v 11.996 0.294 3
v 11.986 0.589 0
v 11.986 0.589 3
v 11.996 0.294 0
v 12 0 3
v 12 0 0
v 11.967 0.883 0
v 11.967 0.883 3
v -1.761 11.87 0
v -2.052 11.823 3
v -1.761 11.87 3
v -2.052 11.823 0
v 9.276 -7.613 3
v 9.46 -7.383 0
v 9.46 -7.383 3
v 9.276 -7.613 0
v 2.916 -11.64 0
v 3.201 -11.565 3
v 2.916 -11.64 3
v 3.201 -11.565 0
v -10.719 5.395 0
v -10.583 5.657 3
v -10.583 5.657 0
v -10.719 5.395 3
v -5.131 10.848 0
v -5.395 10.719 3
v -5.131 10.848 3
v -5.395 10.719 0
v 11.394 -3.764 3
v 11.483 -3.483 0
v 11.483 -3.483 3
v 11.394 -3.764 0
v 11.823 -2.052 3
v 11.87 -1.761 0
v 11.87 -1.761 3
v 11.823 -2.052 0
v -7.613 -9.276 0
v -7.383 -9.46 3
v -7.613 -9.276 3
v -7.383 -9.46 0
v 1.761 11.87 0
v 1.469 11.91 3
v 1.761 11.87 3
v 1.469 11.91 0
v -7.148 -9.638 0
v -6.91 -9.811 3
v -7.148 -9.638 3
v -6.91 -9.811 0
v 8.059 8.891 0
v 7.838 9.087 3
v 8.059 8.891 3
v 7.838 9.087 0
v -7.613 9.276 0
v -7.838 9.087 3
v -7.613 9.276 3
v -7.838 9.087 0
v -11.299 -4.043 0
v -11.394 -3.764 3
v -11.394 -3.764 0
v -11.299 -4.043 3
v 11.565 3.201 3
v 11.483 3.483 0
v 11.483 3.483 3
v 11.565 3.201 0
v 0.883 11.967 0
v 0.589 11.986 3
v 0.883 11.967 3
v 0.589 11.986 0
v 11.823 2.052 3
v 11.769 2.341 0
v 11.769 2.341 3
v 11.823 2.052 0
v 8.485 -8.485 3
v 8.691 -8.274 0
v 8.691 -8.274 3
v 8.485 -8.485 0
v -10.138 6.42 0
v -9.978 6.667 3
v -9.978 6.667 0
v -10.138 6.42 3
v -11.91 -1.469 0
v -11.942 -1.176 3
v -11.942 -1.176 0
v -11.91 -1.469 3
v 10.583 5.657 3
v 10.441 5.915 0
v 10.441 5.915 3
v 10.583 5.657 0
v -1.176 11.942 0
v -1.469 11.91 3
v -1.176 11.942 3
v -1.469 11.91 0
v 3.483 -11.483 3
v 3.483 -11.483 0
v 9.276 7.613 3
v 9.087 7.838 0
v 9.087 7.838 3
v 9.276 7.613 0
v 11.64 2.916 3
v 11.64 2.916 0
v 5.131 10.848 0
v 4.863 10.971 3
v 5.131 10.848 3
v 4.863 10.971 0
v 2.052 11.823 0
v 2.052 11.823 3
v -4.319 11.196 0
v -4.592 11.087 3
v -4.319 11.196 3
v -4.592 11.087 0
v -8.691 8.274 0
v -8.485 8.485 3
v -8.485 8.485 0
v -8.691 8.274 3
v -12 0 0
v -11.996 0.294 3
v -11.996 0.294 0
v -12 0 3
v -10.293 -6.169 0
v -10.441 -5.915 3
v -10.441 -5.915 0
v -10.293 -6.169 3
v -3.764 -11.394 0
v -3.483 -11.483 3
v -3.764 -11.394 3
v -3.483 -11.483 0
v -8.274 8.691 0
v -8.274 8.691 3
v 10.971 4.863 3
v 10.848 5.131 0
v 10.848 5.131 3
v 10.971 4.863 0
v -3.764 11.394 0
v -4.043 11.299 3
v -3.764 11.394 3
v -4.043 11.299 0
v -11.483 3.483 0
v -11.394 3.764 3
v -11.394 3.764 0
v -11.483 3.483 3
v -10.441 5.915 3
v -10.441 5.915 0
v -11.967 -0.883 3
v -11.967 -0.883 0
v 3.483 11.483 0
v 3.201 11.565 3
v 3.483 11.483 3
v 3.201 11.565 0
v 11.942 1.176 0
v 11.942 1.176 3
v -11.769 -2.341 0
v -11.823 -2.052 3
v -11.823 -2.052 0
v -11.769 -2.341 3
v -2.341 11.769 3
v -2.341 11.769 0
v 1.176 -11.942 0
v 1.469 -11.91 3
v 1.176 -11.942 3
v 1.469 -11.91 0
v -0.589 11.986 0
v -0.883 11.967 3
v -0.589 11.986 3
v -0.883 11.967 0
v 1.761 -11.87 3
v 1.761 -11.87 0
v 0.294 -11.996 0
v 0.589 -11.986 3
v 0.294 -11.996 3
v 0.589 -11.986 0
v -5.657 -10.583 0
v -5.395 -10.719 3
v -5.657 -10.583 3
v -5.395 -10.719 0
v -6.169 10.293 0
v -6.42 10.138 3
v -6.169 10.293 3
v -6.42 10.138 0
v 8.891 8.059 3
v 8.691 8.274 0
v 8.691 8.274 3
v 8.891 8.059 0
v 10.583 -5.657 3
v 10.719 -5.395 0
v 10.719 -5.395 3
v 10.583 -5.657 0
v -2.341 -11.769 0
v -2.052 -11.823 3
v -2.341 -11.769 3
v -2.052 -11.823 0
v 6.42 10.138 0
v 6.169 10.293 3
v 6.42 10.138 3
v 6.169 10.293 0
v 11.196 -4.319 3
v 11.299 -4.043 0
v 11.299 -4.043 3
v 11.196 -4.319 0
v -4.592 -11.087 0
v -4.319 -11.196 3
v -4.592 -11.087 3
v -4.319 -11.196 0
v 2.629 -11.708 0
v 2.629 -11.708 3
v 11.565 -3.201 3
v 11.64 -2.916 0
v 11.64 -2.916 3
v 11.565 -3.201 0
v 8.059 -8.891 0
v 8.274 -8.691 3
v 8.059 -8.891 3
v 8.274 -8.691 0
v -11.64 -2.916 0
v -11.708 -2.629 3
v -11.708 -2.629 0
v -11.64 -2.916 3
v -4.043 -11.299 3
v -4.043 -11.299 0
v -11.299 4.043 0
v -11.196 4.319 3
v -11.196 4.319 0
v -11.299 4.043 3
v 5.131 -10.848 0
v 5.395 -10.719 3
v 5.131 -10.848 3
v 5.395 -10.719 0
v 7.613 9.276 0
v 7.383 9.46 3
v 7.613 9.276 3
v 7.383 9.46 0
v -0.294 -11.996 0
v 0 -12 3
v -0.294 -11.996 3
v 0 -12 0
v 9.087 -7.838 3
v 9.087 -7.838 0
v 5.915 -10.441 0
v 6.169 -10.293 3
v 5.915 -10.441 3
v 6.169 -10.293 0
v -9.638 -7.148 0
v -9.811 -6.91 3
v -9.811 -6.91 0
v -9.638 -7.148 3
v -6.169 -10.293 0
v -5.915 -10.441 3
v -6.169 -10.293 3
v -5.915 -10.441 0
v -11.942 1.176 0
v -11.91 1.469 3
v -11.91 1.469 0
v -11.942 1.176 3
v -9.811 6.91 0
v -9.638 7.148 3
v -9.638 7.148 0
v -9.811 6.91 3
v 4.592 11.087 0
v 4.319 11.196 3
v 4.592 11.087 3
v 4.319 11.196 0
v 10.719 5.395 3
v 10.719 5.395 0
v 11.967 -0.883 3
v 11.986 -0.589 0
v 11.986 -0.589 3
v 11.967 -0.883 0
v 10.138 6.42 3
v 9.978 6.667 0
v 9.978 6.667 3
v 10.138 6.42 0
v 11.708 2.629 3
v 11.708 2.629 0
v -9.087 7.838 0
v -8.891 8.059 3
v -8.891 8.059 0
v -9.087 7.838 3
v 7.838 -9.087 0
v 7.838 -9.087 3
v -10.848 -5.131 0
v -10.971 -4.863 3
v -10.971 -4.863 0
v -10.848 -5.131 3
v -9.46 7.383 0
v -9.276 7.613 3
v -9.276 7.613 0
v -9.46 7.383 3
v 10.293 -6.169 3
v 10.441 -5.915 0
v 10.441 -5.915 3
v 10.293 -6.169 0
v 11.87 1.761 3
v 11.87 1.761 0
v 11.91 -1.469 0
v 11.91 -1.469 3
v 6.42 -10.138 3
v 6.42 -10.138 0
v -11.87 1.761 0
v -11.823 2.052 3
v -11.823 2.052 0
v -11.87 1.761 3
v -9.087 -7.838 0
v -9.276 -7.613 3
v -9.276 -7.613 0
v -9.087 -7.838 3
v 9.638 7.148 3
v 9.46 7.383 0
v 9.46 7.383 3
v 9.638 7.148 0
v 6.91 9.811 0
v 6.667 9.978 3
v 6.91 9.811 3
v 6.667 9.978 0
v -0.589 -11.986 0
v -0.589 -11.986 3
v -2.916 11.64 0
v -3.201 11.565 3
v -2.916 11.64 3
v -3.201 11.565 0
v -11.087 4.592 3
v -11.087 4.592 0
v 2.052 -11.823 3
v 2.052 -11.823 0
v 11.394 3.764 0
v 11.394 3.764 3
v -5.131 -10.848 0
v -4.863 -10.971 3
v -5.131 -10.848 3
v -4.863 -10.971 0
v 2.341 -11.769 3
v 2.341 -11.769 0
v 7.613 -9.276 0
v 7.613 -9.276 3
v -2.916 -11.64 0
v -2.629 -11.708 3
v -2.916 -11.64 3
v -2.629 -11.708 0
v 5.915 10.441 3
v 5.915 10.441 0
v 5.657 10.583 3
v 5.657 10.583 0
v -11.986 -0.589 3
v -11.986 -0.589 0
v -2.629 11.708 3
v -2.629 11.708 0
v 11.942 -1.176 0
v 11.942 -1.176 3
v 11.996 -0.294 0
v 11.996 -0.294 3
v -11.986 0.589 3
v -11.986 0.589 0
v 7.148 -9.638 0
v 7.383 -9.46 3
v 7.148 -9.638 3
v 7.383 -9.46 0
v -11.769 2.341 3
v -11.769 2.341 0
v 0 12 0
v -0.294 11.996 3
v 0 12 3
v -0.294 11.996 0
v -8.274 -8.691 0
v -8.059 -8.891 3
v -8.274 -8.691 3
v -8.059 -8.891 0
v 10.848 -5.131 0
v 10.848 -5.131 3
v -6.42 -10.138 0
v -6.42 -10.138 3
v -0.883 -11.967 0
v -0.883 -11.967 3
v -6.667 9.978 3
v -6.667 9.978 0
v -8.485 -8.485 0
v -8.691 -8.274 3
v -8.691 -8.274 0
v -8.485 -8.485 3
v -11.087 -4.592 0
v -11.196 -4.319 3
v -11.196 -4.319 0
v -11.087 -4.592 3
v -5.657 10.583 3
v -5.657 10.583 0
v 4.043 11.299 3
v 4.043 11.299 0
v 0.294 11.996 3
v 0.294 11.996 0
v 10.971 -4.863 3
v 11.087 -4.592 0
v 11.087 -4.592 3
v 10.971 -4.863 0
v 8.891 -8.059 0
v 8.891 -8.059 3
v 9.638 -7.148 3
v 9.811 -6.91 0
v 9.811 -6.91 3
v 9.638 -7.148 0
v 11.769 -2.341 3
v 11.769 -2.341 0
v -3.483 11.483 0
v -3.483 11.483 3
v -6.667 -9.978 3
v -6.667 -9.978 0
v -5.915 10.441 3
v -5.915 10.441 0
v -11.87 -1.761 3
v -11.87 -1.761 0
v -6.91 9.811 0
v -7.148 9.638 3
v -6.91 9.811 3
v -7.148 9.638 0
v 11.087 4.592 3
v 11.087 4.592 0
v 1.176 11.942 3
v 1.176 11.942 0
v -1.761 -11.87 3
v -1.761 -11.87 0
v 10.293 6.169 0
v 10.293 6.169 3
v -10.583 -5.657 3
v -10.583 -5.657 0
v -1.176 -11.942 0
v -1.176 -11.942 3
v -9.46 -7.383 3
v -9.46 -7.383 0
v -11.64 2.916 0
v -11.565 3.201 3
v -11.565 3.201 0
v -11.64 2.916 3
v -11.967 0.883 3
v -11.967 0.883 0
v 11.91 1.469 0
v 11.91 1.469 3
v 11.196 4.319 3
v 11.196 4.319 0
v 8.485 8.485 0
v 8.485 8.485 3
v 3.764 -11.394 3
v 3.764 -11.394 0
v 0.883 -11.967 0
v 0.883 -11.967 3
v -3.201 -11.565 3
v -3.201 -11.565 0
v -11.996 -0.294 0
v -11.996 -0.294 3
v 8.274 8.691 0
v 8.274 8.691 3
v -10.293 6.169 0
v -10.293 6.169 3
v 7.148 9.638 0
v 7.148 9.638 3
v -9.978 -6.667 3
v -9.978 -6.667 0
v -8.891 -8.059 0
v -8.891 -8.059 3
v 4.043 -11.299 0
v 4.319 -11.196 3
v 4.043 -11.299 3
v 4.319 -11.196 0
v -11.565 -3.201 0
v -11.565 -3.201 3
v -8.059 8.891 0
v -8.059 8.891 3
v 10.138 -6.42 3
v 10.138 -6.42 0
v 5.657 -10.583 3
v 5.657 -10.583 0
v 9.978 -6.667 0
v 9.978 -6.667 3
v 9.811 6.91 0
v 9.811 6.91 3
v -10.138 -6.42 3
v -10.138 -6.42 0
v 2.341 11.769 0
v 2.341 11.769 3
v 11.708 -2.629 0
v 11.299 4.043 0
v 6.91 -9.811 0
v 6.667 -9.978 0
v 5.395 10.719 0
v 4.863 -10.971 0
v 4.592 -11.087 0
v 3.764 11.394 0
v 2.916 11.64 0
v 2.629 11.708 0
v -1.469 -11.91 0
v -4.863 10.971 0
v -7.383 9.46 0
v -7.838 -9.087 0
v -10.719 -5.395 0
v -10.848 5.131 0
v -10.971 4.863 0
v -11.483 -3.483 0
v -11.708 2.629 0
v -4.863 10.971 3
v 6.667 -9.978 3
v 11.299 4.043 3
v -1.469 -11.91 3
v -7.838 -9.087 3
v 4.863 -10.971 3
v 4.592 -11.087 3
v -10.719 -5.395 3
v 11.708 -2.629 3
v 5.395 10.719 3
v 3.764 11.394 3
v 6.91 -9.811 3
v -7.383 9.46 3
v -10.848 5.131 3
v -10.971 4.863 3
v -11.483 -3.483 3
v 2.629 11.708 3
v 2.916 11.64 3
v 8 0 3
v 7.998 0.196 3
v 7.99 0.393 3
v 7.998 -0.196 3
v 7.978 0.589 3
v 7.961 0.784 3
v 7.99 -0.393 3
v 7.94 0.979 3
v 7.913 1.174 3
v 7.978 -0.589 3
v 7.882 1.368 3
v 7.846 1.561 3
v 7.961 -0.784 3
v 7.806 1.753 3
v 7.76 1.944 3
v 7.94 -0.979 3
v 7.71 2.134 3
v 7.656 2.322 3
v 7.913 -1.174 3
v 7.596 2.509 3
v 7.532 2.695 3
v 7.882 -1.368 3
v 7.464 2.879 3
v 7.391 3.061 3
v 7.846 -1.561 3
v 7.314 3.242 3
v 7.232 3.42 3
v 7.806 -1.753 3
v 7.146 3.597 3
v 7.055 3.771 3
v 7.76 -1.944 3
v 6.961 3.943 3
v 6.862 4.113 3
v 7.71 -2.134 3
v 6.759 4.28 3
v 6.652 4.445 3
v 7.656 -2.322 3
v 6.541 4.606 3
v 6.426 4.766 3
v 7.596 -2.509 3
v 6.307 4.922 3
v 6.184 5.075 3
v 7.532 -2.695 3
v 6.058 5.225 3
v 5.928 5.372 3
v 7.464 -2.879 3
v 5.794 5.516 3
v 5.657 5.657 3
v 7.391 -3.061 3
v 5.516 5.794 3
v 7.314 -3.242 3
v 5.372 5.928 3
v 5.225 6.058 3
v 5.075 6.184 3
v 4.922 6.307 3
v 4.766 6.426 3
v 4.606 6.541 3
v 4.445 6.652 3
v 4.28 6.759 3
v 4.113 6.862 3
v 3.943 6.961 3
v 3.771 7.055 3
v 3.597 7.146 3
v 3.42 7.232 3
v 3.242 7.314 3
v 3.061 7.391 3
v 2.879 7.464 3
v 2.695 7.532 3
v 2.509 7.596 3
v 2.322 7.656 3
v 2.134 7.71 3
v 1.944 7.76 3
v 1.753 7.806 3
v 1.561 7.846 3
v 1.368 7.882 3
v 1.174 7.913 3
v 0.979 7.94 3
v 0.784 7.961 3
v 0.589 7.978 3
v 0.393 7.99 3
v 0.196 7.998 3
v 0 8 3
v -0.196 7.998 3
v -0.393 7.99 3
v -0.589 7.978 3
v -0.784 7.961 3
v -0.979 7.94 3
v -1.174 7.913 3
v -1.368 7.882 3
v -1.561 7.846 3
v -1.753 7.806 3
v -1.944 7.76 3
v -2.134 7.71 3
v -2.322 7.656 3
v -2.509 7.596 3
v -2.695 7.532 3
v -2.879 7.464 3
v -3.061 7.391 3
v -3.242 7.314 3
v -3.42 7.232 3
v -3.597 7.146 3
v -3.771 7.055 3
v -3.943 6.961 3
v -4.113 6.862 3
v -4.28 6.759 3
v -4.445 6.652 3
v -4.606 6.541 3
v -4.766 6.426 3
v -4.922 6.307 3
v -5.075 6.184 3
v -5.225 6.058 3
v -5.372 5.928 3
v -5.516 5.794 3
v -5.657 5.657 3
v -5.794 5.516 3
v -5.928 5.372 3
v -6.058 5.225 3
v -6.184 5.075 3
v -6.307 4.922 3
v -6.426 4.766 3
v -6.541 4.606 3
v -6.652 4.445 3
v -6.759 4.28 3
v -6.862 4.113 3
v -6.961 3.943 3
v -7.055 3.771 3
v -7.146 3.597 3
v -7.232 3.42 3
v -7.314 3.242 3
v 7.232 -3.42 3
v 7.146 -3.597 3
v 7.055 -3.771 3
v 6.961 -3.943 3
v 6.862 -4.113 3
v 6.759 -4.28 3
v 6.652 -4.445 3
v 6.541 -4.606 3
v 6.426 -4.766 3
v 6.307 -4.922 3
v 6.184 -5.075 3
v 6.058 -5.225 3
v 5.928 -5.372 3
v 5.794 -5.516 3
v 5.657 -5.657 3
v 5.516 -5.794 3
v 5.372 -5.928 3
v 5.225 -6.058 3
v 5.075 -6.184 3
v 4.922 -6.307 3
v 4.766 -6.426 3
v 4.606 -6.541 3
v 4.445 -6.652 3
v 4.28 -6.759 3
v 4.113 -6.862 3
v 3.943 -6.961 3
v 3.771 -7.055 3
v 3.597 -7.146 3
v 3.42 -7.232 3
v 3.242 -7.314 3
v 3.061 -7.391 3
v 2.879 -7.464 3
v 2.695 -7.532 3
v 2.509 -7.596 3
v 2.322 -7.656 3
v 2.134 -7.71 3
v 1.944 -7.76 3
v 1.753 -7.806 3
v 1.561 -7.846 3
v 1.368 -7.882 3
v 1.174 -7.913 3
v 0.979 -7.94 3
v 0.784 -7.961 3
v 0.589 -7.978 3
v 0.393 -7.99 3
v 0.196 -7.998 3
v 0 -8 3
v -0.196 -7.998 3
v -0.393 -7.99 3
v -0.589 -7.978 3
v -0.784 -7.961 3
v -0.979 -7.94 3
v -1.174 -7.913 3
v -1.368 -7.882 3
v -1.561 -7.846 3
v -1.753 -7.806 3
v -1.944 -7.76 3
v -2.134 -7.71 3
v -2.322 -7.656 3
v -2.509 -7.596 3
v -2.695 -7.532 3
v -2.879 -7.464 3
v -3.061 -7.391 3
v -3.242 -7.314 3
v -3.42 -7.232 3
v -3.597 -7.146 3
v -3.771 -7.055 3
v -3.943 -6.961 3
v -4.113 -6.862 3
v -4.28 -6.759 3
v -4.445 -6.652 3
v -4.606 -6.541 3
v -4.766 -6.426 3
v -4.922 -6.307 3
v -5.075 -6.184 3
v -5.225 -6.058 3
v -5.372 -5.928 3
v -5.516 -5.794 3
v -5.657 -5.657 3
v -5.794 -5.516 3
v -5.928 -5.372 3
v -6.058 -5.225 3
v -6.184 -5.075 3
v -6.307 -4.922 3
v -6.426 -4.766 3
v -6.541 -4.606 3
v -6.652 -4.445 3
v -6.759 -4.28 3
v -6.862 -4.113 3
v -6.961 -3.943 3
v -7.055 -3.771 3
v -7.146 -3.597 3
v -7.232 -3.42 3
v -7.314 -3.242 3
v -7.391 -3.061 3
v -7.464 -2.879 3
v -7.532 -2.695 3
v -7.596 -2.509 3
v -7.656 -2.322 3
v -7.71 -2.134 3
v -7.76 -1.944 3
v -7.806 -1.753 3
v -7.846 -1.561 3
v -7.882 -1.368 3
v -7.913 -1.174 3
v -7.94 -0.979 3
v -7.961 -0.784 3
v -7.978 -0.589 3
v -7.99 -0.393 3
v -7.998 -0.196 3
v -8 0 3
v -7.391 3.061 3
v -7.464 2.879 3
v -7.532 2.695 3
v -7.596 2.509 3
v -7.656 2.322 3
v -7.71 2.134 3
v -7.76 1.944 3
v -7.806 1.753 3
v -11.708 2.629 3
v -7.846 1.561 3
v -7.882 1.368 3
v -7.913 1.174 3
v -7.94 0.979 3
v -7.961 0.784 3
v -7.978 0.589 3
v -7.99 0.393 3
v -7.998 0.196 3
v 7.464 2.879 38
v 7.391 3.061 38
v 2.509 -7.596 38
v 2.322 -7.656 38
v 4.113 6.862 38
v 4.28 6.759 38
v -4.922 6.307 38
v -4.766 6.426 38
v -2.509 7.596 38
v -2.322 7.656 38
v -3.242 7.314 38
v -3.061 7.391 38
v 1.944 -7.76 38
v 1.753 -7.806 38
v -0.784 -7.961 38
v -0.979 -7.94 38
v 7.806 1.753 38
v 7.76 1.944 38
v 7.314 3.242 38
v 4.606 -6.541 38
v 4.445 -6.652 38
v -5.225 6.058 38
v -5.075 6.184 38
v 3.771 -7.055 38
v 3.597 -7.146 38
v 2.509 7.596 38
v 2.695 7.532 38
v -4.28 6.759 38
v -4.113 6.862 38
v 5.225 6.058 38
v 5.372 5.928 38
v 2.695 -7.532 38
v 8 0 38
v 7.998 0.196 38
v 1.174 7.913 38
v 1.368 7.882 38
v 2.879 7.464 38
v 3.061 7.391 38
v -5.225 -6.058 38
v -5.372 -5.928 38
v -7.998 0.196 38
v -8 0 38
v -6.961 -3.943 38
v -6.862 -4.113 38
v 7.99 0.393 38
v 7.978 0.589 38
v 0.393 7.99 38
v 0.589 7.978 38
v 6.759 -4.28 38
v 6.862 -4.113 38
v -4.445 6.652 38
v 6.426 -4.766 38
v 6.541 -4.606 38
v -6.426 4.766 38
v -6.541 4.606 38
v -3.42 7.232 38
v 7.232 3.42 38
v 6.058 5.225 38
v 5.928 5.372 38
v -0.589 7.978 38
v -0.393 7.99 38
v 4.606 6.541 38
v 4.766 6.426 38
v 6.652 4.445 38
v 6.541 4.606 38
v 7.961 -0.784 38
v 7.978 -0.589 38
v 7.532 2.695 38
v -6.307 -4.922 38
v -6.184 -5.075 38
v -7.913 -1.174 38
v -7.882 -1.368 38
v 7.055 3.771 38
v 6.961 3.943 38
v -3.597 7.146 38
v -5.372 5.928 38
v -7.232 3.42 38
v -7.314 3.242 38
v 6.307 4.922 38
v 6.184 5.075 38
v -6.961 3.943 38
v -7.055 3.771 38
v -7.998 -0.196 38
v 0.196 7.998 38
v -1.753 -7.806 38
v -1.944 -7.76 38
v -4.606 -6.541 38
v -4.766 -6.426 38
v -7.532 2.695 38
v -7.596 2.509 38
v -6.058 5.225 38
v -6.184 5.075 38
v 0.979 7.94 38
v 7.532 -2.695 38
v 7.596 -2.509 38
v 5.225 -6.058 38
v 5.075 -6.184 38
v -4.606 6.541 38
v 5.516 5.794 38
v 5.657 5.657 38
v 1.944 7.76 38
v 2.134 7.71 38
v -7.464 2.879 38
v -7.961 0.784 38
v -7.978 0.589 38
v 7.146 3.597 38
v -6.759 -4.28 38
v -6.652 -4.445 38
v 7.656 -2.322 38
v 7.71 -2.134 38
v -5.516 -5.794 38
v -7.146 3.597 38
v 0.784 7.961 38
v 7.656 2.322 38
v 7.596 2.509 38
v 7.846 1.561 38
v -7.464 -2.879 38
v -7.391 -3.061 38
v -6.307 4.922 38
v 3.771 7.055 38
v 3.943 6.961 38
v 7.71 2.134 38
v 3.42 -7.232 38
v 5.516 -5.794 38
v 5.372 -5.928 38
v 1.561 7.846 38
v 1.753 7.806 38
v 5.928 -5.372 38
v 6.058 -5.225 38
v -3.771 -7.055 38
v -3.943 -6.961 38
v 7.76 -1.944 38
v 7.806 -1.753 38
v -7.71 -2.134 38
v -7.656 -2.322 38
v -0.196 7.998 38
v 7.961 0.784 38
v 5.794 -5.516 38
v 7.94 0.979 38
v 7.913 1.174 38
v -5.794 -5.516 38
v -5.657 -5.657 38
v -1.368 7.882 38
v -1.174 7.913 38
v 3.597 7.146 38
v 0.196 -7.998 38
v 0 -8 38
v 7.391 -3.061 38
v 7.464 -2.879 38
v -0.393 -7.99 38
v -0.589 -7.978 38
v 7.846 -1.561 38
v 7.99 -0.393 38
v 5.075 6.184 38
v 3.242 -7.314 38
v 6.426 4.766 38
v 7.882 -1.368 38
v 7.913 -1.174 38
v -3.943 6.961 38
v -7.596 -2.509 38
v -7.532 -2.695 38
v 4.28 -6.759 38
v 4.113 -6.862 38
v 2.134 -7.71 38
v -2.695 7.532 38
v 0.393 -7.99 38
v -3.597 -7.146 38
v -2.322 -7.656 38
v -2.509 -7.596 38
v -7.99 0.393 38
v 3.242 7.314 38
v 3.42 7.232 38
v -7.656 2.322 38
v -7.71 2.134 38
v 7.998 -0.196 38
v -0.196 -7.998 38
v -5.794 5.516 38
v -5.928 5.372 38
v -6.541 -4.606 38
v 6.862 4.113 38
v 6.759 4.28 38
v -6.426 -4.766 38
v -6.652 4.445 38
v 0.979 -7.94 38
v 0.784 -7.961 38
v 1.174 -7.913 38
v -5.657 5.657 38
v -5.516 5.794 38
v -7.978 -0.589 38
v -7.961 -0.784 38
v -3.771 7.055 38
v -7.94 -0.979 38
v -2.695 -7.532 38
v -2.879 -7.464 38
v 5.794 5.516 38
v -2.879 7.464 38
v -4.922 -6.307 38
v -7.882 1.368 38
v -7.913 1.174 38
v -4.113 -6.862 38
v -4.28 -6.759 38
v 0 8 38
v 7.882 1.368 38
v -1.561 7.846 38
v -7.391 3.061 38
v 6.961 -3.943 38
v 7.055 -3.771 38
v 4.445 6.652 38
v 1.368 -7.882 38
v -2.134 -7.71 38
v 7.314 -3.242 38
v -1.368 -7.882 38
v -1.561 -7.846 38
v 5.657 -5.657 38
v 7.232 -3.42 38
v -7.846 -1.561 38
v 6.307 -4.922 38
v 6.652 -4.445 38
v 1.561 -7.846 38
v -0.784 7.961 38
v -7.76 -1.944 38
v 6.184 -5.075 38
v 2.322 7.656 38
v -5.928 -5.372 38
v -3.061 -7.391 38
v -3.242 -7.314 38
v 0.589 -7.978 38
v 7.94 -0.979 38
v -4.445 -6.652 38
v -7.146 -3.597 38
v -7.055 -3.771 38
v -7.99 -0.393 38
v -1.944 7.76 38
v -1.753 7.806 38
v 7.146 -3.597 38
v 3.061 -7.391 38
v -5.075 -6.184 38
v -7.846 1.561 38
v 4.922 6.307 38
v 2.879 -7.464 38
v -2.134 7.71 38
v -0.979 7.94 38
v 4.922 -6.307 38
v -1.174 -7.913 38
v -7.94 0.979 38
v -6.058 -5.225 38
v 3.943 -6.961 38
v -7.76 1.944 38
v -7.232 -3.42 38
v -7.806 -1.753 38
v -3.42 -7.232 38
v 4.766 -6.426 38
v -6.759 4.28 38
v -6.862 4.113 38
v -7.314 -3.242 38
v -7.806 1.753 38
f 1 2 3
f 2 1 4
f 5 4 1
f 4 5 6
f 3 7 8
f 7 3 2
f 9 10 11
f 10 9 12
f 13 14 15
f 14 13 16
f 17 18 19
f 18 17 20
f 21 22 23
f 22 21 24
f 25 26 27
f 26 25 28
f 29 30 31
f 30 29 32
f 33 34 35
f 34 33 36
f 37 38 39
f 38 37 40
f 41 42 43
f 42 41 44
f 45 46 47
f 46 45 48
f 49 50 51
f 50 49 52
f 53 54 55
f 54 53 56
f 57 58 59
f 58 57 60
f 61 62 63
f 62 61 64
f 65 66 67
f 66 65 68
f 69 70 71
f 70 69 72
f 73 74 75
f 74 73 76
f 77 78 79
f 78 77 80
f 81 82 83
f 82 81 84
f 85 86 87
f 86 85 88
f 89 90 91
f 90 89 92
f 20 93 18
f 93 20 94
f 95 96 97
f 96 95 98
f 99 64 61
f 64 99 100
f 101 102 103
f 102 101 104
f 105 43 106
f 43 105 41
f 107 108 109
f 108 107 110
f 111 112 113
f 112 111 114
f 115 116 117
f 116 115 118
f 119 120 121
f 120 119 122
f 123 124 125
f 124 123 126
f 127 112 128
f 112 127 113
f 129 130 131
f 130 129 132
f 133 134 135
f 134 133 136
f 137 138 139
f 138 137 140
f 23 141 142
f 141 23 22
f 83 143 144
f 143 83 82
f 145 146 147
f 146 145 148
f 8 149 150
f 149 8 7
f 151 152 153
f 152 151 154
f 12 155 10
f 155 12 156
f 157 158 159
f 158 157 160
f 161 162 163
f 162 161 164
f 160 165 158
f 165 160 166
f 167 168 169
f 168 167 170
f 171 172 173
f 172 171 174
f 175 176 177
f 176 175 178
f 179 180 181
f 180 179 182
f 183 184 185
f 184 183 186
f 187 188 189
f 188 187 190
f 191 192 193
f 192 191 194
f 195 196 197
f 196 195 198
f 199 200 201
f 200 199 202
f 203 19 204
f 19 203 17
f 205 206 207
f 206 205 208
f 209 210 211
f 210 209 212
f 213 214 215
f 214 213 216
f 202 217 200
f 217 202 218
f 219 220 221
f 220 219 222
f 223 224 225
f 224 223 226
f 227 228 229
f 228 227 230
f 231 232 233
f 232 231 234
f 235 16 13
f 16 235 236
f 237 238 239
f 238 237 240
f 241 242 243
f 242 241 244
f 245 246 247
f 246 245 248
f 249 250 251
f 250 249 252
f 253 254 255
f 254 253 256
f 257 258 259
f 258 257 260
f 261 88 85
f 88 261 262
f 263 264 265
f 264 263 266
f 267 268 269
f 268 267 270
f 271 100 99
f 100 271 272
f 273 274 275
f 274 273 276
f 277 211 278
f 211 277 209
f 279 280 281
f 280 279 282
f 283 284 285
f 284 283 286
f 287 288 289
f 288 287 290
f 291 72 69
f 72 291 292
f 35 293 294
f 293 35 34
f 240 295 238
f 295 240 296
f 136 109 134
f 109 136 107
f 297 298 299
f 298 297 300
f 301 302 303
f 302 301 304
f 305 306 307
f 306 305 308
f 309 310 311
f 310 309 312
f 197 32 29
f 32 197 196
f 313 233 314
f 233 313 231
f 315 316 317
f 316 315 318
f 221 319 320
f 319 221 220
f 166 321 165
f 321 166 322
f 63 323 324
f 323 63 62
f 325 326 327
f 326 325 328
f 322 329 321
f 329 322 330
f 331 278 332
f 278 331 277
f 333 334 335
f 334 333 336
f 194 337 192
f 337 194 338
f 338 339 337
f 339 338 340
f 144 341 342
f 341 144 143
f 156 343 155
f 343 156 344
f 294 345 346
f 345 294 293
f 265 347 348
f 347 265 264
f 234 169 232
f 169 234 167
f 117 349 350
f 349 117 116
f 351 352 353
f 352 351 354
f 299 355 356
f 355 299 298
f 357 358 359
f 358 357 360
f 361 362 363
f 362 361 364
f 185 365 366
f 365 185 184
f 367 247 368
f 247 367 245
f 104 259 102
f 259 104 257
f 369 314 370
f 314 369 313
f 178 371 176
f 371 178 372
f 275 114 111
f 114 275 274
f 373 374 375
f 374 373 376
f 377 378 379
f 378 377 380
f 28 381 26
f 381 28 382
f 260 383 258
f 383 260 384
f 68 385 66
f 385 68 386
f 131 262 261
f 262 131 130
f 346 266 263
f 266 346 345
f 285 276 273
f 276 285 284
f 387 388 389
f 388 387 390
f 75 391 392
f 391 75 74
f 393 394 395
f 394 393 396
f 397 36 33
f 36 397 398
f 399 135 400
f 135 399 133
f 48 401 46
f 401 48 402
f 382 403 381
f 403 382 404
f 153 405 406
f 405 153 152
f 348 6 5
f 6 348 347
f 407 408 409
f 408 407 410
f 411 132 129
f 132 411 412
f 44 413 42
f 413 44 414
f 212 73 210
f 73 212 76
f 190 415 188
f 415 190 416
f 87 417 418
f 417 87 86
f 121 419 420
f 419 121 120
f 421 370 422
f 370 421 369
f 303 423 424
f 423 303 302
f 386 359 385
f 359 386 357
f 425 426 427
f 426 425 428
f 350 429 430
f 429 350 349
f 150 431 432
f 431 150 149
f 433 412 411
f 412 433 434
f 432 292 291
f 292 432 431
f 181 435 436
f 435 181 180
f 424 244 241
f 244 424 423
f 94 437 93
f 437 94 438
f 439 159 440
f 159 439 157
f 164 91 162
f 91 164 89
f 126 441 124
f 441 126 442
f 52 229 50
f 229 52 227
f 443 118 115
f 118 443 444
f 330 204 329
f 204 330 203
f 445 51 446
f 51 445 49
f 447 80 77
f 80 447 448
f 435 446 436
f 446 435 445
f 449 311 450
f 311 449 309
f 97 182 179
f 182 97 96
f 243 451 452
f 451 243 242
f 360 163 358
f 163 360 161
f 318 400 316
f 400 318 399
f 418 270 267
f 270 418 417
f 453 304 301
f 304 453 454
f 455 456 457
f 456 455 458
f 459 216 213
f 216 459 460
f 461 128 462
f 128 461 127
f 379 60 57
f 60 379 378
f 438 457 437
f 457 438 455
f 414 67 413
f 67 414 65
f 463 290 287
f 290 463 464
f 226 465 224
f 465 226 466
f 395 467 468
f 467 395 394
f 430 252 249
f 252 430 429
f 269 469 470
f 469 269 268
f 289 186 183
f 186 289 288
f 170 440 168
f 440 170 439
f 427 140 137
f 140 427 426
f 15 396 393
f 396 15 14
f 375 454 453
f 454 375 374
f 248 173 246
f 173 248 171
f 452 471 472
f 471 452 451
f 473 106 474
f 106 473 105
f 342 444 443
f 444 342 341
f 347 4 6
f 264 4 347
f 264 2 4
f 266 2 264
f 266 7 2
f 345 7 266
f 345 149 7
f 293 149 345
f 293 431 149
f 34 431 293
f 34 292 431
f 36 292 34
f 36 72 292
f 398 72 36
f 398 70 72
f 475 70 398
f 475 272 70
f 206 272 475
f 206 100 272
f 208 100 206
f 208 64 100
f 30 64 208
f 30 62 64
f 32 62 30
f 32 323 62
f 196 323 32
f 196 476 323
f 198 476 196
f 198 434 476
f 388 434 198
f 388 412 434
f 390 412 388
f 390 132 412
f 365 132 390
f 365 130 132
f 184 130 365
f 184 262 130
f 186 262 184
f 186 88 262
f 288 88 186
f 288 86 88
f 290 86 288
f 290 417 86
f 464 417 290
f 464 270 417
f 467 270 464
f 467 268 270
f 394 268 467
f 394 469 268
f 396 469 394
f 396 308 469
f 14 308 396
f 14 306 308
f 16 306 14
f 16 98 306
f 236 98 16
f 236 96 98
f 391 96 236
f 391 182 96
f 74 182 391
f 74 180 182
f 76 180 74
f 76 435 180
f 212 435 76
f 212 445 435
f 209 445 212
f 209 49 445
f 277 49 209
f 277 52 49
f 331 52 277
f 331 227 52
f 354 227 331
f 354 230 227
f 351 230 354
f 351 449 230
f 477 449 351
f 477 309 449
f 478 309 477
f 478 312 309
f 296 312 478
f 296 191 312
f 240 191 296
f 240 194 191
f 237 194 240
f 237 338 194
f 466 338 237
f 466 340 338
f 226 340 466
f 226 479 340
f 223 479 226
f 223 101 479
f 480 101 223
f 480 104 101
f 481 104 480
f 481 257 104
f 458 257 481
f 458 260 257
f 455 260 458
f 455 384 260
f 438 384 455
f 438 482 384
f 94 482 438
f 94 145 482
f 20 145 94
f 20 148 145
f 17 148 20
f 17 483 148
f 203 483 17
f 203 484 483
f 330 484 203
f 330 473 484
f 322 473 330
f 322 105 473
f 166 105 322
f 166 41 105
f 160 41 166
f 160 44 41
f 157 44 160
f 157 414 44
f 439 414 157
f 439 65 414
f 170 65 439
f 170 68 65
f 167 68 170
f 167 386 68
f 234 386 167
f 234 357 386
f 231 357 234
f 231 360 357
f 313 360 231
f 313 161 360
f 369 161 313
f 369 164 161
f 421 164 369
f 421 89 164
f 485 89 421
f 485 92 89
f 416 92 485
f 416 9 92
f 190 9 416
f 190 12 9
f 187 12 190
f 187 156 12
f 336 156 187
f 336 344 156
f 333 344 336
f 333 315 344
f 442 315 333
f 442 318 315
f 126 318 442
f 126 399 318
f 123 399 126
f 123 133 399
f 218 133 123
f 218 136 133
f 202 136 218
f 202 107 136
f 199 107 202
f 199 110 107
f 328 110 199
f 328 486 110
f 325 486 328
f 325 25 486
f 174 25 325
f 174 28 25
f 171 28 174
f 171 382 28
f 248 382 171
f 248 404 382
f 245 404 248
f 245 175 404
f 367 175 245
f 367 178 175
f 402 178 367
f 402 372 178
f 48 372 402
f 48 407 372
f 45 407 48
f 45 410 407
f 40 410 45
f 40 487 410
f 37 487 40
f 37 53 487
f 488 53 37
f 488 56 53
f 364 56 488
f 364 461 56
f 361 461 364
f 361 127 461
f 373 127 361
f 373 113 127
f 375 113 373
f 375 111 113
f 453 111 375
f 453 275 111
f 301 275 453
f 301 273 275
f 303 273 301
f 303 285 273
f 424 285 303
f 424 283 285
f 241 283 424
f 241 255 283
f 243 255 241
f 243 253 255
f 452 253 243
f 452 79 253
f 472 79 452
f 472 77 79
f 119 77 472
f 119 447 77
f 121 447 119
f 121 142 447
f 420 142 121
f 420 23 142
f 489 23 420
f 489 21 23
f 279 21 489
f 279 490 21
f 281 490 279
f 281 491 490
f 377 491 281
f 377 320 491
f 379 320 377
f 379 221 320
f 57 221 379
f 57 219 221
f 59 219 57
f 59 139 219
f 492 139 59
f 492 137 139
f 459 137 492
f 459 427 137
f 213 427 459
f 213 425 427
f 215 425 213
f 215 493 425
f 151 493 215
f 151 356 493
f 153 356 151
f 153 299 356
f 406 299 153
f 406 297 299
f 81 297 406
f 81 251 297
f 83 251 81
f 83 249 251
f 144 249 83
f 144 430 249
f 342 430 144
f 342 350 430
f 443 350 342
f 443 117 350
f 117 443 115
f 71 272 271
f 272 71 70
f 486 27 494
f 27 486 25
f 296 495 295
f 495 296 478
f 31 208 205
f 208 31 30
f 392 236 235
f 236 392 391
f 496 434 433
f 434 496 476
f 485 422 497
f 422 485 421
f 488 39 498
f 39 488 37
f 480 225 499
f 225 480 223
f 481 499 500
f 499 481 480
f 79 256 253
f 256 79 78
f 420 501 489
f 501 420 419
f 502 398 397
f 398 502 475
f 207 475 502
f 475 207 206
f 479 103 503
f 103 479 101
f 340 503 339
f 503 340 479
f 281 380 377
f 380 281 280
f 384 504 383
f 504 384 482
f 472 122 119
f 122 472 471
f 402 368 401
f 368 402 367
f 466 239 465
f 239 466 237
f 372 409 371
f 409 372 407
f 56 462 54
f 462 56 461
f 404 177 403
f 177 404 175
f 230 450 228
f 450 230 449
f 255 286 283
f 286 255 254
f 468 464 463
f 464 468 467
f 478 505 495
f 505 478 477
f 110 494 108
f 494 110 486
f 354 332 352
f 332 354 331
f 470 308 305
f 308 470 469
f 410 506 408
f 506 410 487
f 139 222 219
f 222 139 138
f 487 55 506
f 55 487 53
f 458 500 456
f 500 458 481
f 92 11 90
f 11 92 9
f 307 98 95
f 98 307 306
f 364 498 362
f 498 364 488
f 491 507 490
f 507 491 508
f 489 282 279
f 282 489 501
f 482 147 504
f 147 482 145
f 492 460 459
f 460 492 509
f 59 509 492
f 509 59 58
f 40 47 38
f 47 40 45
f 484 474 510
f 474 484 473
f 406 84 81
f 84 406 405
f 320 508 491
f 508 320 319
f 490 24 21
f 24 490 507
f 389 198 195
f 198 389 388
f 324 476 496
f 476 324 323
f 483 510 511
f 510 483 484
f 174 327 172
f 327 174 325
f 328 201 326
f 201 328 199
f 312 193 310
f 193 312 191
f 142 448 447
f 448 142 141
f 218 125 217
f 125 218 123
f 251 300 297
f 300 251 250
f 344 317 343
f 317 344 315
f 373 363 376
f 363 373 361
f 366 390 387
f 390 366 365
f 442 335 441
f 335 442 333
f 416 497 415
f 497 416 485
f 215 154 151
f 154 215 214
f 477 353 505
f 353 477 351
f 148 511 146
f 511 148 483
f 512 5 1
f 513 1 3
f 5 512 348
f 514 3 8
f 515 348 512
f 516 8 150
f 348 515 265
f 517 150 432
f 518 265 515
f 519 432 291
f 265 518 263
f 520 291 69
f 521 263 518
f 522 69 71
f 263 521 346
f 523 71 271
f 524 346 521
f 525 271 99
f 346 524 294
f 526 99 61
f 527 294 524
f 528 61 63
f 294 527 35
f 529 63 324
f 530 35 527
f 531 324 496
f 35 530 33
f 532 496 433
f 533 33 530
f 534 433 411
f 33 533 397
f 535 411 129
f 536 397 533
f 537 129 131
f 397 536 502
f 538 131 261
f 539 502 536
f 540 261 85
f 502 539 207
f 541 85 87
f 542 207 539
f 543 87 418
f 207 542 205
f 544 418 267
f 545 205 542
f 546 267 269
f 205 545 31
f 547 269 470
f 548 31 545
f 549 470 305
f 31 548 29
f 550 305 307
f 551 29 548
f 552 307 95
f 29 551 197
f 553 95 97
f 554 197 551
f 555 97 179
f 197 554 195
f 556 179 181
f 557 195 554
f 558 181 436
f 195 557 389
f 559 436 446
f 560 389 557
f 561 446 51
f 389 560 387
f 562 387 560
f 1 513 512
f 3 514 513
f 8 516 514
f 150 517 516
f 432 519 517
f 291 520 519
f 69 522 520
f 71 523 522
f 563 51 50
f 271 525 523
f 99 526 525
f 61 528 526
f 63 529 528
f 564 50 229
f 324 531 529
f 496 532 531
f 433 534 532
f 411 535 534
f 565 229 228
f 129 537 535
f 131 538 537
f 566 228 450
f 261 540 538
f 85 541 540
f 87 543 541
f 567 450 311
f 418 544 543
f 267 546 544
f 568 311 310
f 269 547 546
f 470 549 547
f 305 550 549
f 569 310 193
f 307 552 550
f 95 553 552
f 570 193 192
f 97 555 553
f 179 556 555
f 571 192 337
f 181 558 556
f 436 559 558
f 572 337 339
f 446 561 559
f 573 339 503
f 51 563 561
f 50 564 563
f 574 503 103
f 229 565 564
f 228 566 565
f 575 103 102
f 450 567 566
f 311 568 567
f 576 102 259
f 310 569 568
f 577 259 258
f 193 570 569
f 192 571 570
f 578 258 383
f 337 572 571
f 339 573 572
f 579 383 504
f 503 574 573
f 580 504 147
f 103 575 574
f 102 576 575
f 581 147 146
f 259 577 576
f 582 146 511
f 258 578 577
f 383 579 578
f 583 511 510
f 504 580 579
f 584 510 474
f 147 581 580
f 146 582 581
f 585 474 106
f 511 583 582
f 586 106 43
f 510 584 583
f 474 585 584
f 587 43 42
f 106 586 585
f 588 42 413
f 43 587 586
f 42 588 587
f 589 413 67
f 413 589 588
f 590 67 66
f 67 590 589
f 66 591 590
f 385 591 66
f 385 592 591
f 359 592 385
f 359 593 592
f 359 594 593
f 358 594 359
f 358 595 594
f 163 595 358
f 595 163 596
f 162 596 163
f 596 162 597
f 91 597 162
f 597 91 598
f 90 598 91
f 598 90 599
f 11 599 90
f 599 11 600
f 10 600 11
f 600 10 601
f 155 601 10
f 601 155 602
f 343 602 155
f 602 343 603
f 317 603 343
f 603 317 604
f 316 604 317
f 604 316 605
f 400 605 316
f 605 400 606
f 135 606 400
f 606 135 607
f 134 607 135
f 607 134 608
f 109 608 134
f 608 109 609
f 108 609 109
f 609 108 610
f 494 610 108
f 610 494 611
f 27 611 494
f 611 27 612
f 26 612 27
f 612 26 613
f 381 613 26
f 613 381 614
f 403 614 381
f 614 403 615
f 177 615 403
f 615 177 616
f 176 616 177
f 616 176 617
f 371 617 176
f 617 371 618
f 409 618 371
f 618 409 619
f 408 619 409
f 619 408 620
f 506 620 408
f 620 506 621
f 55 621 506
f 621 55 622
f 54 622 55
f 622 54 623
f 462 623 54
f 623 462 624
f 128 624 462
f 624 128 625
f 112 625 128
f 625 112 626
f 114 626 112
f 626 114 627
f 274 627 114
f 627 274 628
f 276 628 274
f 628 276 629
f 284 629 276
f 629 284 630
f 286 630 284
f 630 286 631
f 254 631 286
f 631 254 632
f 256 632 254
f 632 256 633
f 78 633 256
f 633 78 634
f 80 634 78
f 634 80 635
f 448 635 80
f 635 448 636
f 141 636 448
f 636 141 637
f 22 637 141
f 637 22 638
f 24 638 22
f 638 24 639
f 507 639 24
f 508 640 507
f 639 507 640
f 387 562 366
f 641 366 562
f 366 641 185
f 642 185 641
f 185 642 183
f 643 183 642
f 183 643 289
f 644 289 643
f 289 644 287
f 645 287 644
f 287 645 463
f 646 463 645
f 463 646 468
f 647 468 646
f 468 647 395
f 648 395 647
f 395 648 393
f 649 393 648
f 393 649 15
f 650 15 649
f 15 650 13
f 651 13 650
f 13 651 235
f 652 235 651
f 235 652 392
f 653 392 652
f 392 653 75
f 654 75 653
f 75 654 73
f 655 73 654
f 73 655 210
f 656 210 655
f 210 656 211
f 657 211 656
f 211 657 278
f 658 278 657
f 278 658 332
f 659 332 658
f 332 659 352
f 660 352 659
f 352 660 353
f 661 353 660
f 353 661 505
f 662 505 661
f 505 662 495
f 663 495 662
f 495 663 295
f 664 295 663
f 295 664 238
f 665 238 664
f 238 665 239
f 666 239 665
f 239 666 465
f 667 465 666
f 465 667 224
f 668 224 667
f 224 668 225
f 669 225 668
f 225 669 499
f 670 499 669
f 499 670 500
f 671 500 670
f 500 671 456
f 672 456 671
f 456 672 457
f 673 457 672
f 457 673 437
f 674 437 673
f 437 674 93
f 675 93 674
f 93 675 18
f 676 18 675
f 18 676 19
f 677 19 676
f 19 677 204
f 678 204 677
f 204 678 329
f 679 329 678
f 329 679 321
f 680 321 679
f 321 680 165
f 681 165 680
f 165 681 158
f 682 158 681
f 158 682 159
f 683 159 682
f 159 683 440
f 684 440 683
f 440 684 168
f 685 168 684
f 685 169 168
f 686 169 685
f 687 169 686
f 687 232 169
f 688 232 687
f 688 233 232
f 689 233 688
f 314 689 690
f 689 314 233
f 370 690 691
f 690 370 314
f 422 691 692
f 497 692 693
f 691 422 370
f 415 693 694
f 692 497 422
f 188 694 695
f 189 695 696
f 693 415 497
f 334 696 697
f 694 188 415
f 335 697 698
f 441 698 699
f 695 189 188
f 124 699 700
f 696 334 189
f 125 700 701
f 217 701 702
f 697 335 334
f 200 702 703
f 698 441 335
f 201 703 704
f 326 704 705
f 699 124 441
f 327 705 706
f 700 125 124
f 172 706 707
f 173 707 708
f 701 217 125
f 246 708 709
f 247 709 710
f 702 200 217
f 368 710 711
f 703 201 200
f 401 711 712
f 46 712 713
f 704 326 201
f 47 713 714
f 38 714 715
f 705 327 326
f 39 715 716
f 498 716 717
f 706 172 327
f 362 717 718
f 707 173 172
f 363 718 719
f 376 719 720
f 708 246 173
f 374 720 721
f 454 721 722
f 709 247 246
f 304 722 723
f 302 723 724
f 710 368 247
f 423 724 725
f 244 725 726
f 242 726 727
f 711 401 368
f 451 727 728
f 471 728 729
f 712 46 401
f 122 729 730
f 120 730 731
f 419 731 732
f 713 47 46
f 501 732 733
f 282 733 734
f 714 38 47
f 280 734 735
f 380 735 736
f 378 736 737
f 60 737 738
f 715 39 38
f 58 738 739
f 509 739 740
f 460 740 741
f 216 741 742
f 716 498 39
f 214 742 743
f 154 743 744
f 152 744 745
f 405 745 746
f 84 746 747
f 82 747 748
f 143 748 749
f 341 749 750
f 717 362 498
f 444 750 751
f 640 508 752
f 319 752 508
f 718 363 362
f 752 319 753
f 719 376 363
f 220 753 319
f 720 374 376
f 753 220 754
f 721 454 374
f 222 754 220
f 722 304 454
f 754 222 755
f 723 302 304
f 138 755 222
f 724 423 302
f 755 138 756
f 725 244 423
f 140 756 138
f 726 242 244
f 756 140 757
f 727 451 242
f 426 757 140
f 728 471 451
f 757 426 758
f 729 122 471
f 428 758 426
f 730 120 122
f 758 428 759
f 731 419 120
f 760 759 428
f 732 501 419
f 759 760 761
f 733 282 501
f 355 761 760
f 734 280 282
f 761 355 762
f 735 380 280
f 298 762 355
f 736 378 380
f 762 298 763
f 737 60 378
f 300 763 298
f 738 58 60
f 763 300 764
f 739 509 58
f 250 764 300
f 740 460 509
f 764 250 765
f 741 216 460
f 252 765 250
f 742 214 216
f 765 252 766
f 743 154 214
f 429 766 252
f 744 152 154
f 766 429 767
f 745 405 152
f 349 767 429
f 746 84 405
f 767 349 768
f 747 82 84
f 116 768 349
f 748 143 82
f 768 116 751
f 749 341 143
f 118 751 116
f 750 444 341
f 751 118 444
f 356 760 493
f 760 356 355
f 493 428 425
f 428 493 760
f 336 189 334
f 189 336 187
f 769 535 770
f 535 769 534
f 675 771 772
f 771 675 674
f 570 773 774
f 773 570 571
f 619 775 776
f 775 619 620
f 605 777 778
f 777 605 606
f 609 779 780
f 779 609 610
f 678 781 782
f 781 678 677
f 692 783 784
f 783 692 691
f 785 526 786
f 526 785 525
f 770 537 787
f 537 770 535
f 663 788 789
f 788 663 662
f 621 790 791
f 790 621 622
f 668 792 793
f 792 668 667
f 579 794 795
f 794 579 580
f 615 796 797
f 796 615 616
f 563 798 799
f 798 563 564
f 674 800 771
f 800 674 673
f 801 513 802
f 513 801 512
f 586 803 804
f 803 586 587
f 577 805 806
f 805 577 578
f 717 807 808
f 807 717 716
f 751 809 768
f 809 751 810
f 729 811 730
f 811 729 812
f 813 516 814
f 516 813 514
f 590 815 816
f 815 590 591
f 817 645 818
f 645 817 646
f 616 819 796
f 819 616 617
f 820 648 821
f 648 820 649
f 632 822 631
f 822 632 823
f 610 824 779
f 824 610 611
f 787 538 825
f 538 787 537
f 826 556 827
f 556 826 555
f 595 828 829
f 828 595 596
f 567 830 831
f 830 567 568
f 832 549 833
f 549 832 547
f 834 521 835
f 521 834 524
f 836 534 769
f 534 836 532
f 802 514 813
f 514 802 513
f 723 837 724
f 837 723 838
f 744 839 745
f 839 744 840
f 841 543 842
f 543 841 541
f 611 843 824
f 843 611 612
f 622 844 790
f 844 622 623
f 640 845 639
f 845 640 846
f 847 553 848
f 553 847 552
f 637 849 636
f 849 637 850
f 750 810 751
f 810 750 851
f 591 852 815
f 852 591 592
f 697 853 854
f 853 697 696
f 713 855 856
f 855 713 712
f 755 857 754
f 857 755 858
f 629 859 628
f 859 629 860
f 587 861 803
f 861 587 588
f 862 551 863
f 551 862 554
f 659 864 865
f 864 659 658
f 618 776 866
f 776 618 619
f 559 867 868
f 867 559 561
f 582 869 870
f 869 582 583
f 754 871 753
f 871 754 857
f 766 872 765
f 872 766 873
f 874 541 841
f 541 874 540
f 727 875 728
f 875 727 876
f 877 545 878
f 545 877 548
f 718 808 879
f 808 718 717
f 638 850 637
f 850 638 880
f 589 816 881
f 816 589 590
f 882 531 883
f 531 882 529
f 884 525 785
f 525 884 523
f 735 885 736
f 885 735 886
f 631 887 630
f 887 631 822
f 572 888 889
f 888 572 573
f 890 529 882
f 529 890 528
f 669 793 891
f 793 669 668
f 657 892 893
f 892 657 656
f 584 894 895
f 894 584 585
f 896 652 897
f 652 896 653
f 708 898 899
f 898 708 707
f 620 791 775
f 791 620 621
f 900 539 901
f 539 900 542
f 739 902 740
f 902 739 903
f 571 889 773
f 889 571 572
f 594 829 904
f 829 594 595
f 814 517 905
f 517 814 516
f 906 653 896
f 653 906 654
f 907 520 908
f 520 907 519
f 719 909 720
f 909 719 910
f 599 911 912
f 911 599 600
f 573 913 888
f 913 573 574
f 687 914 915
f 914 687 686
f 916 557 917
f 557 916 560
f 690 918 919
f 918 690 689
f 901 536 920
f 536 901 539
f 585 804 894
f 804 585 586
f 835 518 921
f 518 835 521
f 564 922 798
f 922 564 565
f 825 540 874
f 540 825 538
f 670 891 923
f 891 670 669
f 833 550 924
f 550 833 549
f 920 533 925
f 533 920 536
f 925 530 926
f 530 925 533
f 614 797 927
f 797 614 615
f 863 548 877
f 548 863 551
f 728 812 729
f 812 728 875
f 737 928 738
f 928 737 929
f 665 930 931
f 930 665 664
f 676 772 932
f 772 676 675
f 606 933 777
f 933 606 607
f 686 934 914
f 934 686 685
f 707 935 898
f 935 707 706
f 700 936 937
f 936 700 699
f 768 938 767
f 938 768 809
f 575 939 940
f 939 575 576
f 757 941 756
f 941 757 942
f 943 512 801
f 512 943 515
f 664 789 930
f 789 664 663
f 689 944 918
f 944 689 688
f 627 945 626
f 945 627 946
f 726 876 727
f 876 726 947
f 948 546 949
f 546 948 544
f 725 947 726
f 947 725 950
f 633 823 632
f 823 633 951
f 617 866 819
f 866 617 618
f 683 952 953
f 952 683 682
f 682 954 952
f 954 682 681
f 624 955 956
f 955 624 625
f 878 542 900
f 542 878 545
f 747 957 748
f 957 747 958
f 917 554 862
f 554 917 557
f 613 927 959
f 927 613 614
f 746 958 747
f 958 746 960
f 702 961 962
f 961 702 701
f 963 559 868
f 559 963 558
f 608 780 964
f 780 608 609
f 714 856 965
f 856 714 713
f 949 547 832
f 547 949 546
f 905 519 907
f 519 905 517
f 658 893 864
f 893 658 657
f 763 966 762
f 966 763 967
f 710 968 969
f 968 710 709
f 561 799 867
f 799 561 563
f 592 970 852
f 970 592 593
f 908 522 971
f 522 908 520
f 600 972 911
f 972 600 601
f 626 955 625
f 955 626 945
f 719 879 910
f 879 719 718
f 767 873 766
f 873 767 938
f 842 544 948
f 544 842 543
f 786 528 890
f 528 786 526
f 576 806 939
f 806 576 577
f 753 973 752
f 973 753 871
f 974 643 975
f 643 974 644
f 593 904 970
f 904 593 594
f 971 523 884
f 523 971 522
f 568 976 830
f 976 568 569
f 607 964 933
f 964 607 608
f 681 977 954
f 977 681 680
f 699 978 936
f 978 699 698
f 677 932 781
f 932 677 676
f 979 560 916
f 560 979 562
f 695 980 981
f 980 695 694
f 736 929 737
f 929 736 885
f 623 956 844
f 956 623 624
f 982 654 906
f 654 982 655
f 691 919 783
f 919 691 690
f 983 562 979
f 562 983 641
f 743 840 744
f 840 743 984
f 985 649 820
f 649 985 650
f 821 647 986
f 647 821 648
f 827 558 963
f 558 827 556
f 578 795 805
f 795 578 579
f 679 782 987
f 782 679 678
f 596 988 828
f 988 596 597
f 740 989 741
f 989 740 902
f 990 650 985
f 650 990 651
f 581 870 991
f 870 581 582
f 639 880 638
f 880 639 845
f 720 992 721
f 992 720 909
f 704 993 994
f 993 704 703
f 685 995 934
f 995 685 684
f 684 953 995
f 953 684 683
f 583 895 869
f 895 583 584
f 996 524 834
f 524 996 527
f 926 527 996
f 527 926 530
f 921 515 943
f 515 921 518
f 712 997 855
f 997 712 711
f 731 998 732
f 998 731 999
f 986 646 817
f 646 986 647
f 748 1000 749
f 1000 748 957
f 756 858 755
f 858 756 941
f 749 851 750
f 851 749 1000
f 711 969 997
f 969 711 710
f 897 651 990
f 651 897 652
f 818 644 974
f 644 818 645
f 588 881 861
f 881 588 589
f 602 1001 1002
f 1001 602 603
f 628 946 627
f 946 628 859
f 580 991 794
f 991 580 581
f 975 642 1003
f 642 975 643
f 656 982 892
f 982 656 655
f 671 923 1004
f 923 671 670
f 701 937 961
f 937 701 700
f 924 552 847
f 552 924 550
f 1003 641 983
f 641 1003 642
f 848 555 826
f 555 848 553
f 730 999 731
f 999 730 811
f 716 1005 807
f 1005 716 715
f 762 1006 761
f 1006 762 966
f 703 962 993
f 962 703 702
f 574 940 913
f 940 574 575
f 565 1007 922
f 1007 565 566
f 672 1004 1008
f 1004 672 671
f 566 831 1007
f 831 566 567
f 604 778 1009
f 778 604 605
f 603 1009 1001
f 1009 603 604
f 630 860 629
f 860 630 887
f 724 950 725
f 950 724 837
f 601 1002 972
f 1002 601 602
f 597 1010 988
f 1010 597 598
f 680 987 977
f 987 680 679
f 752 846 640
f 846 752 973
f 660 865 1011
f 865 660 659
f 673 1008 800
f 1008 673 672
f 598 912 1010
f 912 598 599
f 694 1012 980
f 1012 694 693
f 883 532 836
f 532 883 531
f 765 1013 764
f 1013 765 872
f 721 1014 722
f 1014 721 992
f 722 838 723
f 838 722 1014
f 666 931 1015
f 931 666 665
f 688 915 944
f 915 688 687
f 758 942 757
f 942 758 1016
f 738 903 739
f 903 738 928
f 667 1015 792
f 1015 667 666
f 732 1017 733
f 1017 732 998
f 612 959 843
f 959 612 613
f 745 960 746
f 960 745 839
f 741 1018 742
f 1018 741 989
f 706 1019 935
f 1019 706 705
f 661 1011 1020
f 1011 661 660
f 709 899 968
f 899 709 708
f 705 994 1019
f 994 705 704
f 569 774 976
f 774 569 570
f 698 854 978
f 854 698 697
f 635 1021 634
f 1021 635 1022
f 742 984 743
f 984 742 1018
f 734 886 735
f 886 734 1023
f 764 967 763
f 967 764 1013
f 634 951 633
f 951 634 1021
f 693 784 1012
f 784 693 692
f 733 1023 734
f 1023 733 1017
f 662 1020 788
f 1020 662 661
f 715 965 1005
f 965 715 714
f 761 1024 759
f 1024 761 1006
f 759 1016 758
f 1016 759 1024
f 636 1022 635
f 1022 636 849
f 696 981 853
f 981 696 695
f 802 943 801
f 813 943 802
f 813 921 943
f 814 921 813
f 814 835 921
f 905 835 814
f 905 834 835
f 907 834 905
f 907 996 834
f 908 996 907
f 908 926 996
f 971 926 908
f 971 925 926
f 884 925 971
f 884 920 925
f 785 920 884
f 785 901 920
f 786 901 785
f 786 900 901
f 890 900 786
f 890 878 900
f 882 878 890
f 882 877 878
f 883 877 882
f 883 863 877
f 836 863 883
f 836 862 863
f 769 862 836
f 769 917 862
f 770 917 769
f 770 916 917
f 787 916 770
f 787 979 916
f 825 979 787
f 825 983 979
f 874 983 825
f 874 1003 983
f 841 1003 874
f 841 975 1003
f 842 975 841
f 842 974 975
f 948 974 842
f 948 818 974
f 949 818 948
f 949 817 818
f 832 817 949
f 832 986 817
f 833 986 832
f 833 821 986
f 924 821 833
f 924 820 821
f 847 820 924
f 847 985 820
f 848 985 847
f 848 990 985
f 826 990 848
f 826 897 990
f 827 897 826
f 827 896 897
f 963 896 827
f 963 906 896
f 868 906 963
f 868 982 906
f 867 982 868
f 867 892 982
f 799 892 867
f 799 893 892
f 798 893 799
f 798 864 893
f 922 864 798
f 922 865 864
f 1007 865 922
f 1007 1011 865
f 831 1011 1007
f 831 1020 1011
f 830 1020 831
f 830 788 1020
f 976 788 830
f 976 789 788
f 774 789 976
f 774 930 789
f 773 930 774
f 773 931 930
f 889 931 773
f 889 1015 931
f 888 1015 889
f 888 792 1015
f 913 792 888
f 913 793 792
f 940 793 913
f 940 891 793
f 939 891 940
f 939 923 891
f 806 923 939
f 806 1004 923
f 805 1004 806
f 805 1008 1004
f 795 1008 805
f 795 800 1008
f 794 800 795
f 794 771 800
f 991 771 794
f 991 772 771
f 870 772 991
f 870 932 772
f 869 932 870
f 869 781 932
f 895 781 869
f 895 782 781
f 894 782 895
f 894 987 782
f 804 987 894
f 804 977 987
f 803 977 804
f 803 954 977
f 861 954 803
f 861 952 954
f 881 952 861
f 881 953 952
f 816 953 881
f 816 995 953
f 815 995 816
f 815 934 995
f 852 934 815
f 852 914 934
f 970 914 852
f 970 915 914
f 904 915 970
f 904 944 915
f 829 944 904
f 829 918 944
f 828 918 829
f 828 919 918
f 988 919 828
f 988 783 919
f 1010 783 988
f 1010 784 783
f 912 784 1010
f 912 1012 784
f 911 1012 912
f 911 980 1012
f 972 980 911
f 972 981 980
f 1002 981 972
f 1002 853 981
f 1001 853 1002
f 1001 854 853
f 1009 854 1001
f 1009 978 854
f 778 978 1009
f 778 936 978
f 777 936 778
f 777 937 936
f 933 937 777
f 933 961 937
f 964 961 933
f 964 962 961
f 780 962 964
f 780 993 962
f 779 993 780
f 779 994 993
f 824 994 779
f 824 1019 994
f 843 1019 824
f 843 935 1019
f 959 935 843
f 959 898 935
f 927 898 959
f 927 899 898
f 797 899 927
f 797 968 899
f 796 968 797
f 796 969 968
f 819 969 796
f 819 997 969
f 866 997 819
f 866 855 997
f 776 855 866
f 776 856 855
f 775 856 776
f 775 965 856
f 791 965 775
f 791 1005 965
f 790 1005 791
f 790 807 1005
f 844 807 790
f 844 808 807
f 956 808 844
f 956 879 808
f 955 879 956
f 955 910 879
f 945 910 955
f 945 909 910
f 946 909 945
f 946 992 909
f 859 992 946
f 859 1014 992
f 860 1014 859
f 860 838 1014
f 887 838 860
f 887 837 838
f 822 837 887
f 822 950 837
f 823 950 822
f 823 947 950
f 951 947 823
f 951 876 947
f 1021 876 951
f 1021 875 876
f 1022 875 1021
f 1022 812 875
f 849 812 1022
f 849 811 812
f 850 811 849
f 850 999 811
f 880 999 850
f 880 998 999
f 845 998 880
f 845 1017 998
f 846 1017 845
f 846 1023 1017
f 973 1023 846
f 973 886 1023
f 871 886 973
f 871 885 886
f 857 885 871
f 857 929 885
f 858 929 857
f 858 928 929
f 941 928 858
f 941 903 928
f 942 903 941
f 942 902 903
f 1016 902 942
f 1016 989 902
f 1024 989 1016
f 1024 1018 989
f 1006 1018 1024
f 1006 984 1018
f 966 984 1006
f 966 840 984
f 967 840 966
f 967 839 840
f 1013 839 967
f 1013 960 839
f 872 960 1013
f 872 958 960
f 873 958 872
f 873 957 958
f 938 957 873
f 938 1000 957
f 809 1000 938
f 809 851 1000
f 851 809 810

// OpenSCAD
////////////////////////////////////////////////////////////////////////////////////////////////////////////////////////
// measurements

plug_r = 16.0 / 2;

////////////////////////////////////////////////////////////////////////////////////////////////////////////////////////
// settings

render_mode = "print-holder";

plug_z = 35;

base_r = 12;
base_z = 3;

////////////////////////////////////////////////////////////////////////////////////////////////////////////////////////
// calculations

$fn = $preview ? 128 : 256;

////////////////////////////////////////////////////////////////////////////////////////////////////////////////////////
// models

if( render_mode == "print-holder" )
{
    KegeratorPlug();
}
else
{
    assert( false, str( "Unknown render mode: ", render_mode ) );
}

////////////////////////////////////////////////////////////////////////////////////////////////////////////////////////

module KegeratorPlug()
{
    // base
    cylinder(
        r = base_r,
        h = base_z
        );

    // plug
    translate([ 0, 0, base_z ])
        cylinder( r = plug_r, h = plug_z );
}

////////////////////////////////////////////////////////////////////////////////////////////////////////////////////////
